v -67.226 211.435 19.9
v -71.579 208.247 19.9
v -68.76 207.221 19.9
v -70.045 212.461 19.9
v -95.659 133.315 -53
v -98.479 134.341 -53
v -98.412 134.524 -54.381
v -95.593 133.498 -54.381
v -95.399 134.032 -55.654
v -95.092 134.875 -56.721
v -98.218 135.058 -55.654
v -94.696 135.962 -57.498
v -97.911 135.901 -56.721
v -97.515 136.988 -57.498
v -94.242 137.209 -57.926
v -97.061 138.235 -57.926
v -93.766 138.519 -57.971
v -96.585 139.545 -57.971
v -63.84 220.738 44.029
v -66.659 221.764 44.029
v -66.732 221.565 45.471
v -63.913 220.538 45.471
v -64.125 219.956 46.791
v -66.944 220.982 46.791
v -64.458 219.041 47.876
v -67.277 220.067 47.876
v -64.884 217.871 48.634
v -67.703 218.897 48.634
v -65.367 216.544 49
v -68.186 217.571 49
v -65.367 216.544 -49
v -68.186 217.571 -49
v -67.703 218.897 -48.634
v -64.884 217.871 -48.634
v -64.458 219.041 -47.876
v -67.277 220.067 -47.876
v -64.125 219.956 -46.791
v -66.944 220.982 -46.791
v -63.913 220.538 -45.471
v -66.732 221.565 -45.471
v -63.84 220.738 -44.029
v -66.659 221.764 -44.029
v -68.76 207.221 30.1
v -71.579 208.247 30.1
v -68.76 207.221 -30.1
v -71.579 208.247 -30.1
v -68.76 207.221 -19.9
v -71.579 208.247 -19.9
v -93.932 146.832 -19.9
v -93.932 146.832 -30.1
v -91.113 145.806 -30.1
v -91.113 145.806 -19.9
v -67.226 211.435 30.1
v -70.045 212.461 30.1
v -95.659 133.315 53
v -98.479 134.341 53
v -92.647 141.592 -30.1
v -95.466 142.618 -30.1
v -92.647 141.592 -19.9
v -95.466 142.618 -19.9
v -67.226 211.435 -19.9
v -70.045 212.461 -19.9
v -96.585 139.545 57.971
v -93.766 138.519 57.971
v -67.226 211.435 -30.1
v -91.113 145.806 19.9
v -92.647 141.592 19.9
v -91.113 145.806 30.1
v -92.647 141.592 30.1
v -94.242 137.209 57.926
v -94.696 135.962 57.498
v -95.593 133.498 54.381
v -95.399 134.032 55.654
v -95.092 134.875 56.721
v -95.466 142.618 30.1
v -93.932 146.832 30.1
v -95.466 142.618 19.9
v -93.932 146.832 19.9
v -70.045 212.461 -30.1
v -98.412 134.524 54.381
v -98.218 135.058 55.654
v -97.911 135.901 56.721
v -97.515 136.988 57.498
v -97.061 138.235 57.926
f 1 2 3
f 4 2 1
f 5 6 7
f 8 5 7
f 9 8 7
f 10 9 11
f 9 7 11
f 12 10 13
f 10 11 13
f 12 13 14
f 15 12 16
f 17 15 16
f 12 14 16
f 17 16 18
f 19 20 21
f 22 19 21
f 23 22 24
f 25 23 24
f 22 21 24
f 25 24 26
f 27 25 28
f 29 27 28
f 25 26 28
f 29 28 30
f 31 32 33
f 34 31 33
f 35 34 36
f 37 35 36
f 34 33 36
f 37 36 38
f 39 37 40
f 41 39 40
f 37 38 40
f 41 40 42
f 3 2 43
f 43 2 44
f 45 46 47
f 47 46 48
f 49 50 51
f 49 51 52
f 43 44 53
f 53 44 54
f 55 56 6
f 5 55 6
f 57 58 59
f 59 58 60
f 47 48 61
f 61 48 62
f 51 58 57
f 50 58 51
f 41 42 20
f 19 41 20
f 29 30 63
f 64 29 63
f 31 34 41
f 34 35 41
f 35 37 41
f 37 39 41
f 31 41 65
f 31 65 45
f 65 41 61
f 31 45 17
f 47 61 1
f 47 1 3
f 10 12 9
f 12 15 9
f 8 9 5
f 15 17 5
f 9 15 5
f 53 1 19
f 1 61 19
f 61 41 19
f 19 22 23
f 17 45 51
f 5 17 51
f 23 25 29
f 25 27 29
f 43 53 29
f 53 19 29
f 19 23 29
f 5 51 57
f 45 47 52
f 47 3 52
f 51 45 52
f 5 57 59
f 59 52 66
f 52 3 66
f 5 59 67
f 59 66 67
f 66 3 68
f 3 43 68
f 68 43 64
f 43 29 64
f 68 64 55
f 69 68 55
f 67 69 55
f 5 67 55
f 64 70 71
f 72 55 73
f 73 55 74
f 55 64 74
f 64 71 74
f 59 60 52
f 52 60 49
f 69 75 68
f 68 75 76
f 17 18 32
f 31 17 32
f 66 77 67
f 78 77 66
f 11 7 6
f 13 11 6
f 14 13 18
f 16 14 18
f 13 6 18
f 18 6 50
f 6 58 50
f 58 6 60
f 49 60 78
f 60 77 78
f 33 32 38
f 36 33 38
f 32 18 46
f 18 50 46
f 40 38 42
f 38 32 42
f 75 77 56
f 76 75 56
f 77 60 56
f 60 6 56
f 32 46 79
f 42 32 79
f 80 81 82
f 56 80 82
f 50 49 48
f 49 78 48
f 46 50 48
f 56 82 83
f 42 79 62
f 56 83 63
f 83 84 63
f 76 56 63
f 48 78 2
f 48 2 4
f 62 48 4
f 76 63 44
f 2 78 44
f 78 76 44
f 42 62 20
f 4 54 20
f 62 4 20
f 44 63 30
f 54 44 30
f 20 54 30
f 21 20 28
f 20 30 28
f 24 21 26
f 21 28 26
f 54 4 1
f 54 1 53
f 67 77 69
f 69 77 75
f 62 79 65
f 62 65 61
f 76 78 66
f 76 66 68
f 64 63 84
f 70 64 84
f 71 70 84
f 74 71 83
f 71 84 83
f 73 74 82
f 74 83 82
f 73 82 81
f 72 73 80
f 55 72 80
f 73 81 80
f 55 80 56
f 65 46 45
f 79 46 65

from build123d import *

# Parameters (mm, degrees)
BOSS_EXTRUDE1_DEPTH        = 58
SKETCH3_OUTSIDE_W          = 147.986
SKETCH3_OUTSIDE_H          = 126.948
TAB_AND_SLOT_CONTOUR_DEPTH = 3
MOUNTING_TAB_SLOTS_REACH   = 197.382
SKETCH4_W                  = 10.2
SKETCH4_H                  = 4.48444402


with BuildPart() as part:
    # Sketch1 → Boss-Extrude1 (new, symmetric)
    with BuildSketch(Plane.XY):
        Polygon((-63.840100917, 220.738237129), (-95.659428373, 133.315353441), (-98.478506236, 134.341413871), (-66.659178779, 221.764297559), align=None)
    extrude(amount=BOSS_EXTRUDE1_DEPTH, both=True)

    # Sketch3 outside → tab and slot contour (cut)
    with BuildSketch(Plane(origin=(-130.135207504, 47.365341962, 0), x_dir=(0, 0, 1), z_dir=(-0.9396926207859098, 0.3420201433256651, 0))):
        with Locations((0, 139.075)):
            Rectangle(SKETCH3_OUTSIDE_W, SKETCH3_OUTSIDE_H)
        with BuildLine():
            Line((-44.02892944, 185.59149209), (44.02892944, 185.59149209))
            ThreePointArc((44.02892944, 185.59149209), (47.369183029, 184.312070804), (49, 181.128574477))
            Line((49, 181.128574477), (57.97107056, 98.09508485))
            ThreePointArc((57.97107056, 98.09508485), (56.720578714, 94.217748875), (53, 92.558002463))
            Line((53, 92.558002463), (-53, 92.558002463))
            ThreePointArc((-53, 92.558002463), (-56.720578714, 94.217748875), (-57.97107056, 98.09508485))
            Line((-57.97107056, 98.09508485), (-49, 181.128574477))
            ThreePointArc((-49, 181.128574477), (-47.369183029, 184.312070804), (-44.02892944, 185.59149209))
        make_face(mode=Mode.SUBTRACT)
    extrude(amount=-TAB_AND_SLOT_CONTOUR_DEPTH, mode=Mode.SUBTRACT)

    # Sketch4 → mounting tab slots (cut, up to next)
    with BuildSketch(Plane(origin=(-130.135207504, 47.365341962, 0), x_dir=(0, 0, 1), z_dir=(-0.9396926207859099, 0.3420201433256647, 0)), mode=Mode.PRIVATE) as mounting_tab_slots_sk1:
        with Locations((-25, 173.44927008)):
            Rectangle(SKETCH4_W, SKETCH4_H)
    mounting_tab_slots_tool1 = extrude(mounting_tab_slots_sk1.sketch, amount=-MOUNTING_TAB_SLOTS_REACH, mode=Mode.PRIVATE) & part.part
    # Sketch4 → mounting tab slots (cut, up to next)
    with BuildSketch(Plane(origin=(-130.135207504, 47.365341962, 0), x_dir=(0, 0, 1), z_dir=(-0.9396926207859099, 0.3420201433256647, 0)), mode=Mode.PRIVATE) as mounting_tab_slots_sk2:
        with Locations((-25, 103.608313771)):
            Rectangle(SKETCH4_W, SKETCH4_H)
    mounting_tab_slots_tool2 = extrude(mounting_tab_slots_sk2.sketch, amount=-MOUNTING_TAB_SLOTS_REACH, mode=Mode.PRIVATE) & part.part
    # Sketch4 → mounting tab slots (cut, up to next)
    with BuildSketch(Plane(origin=(-130.135207504, 47.365341962, 0), x_dir=(0, 0, 1), z_dir=(-0.9396926207859099, 0.3420201433256647, 0)), mode=Mode.PRIVATE) as mounting_tab_slots_sk3:
        with Locations((25, 173.44927008)):
            Rectangle(SKETCH4_W, SKETCH4_H)
    mounting_tab_slots_tool3 = extrude(mounting_tab_slots_sk3.sketch, amount=-MOUNTING_TAB_SLOTS_REACH, mode=Mode.PRIVATE) & part.part
    # Sketch4 → mounting tab slots (cut, up to next)
    with BuildSketch(Plane(origin=(-130.135207504, 47.365341962, 0), x_dir=(0, 0, 1), z_dir=(-0.9396926207859099, 0.3420201433256647, 0)), mode=Mode.PRIVATE) as mounting_tab_slots_sk4:
        with Locations((25, 103.608313771)):
            Rectangle(SKETCH4_W, SKETCH4_H)
    mounting_tab_slots_tool4 = extrude(mounting_tab_slots_sk4.sketch, amount=-MOUNTING_TAB_SLOTS_REACH, mode=Mode.PRIVATE) & part.part
    add(mounting_tab_slots_tool1.solids().sort_by_distance((-70.812063, 210.354341, -25))[0], mode=Mode.SUBTRACT)
    add(mounting_tab_slots_tool2.solids().sort_by_distance((-94.699077, 144.72531, -25))[0], mode=Mode.SUBTRACT)
    add(mounting_tab_slots_tool3.solids().sort_by_distance((-70.812063, 210.354341, 25))[0], mode=Mode.SUBTRACT)
    add(mounting_tab_slots_tool4.solids().sort_by_distance((-94.699077, 144.72531, 25))[0], mode=Mode.SUBTRACT)


solid = part.part
